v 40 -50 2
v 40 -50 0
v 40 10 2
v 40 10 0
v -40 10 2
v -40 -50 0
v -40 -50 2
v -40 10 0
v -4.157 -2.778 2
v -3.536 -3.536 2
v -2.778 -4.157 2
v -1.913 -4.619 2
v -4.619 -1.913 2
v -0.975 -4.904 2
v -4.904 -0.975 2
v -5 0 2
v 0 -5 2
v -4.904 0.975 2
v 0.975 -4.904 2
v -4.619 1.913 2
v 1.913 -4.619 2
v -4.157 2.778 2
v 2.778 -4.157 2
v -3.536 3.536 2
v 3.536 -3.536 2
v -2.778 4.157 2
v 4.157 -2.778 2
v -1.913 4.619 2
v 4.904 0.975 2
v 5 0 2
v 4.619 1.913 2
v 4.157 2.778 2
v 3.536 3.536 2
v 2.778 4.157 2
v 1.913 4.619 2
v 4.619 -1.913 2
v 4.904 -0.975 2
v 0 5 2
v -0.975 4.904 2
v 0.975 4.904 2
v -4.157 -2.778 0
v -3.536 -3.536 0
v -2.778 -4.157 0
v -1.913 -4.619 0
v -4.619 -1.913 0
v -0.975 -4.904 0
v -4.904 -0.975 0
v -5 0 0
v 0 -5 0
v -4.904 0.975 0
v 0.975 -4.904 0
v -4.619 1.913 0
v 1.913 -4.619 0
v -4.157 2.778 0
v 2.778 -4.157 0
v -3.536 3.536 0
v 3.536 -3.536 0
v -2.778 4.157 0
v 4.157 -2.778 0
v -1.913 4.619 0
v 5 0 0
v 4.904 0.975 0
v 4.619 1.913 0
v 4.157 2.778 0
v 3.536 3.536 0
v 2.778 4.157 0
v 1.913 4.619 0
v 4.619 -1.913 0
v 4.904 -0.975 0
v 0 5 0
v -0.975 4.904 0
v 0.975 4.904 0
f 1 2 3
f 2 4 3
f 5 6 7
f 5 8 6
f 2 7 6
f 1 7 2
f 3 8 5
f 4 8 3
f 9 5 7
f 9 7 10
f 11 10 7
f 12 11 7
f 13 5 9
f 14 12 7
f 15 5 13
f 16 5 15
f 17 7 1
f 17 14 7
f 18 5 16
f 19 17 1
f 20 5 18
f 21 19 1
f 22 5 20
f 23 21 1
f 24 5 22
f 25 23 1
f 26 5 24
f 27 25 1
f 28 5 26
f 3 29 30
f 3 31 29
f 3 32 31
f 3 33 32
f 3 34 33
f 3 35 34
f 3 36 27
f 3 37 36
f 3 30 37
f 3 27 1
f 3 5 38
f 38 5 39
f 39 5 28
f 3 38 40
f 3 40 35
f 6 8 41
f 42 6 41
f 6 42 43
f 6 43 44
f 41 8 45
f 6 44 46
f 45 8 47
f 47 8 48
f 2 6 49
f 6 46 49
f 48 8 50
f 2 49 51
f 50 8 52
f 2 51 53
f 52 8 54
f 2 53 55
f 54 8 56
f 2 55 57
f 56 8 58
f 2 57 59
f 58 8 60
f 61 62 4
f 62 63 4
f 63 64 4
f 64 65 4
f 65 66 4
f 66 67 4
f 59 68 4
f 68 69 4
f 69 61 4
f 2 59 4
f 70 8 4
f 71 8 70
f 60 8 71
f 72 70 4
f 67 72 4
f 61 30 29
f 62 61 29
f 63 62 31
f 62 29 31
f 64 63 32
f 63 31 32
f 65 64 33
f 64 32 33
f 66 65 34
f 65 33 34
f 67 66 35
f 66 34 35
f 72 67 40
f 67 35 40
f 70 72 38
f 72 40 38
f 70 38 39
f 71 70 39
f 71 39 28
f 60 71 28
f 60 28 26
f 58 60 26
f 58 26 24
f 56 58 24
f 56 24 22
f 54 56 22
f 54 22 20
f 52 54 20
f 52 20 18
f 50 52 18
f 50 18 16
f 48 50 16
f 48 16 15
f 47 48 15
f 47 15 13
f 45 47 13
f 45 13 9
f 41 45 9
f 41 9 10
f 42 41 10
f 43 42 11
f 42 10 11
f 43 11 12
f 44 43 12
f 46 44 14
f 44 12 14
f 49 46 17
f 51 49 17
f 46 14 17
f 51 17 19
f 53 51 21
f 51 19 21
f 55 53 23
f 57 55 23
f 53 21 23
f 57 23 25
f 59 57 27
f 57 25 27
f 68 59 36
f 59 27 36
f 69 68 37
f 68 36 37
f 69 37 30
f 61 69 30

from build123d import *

# Parameters (mm, degrees)
SKETCH_1_W          = 80
SKETCH_1_H          = 20
EXTRUDE_1_DEPTH     = 2
SKETCH_2_R          = 5
CUT_EXTRUDE_1_DEPTH = 42.279534881
SKETCH_3_W          = 80
SKETCH_3_H          = 2
EXTRUDE_2_DEPTH     = 40


with BuildPart() as part:
    # Эскиз1 → Бобышка-Вытянуть1 (new body)
    with BuildSketch(Plane.XY):
        Rectangle(SKETCH_1_W, SKETCH_1_H)
    extrude(amount=EXTRUDE_1_DEPTH)

    # Эскиз2 → Вырез-Вытянуть1 (cut, through all)
    with BuildSketch(Plane.XY.offset(2)):
        Circle(SKETCH_2_R)
    extrude(amount=-CUT_EXTRUDE_1_DEPTH, mode=Mode.SUBTRACT)

    # Эскиз3 → Бобышка-Вытянуть2 (add)
    with BuildSketch(Plane.XZ.offset(10)):
        with Locations((0, 1)):
            Rectangle(SKETCH_3_W, SKETCH_3_H)
    extrude(amount=EXTRUDE_2_DEPTH)


solid = part.part
